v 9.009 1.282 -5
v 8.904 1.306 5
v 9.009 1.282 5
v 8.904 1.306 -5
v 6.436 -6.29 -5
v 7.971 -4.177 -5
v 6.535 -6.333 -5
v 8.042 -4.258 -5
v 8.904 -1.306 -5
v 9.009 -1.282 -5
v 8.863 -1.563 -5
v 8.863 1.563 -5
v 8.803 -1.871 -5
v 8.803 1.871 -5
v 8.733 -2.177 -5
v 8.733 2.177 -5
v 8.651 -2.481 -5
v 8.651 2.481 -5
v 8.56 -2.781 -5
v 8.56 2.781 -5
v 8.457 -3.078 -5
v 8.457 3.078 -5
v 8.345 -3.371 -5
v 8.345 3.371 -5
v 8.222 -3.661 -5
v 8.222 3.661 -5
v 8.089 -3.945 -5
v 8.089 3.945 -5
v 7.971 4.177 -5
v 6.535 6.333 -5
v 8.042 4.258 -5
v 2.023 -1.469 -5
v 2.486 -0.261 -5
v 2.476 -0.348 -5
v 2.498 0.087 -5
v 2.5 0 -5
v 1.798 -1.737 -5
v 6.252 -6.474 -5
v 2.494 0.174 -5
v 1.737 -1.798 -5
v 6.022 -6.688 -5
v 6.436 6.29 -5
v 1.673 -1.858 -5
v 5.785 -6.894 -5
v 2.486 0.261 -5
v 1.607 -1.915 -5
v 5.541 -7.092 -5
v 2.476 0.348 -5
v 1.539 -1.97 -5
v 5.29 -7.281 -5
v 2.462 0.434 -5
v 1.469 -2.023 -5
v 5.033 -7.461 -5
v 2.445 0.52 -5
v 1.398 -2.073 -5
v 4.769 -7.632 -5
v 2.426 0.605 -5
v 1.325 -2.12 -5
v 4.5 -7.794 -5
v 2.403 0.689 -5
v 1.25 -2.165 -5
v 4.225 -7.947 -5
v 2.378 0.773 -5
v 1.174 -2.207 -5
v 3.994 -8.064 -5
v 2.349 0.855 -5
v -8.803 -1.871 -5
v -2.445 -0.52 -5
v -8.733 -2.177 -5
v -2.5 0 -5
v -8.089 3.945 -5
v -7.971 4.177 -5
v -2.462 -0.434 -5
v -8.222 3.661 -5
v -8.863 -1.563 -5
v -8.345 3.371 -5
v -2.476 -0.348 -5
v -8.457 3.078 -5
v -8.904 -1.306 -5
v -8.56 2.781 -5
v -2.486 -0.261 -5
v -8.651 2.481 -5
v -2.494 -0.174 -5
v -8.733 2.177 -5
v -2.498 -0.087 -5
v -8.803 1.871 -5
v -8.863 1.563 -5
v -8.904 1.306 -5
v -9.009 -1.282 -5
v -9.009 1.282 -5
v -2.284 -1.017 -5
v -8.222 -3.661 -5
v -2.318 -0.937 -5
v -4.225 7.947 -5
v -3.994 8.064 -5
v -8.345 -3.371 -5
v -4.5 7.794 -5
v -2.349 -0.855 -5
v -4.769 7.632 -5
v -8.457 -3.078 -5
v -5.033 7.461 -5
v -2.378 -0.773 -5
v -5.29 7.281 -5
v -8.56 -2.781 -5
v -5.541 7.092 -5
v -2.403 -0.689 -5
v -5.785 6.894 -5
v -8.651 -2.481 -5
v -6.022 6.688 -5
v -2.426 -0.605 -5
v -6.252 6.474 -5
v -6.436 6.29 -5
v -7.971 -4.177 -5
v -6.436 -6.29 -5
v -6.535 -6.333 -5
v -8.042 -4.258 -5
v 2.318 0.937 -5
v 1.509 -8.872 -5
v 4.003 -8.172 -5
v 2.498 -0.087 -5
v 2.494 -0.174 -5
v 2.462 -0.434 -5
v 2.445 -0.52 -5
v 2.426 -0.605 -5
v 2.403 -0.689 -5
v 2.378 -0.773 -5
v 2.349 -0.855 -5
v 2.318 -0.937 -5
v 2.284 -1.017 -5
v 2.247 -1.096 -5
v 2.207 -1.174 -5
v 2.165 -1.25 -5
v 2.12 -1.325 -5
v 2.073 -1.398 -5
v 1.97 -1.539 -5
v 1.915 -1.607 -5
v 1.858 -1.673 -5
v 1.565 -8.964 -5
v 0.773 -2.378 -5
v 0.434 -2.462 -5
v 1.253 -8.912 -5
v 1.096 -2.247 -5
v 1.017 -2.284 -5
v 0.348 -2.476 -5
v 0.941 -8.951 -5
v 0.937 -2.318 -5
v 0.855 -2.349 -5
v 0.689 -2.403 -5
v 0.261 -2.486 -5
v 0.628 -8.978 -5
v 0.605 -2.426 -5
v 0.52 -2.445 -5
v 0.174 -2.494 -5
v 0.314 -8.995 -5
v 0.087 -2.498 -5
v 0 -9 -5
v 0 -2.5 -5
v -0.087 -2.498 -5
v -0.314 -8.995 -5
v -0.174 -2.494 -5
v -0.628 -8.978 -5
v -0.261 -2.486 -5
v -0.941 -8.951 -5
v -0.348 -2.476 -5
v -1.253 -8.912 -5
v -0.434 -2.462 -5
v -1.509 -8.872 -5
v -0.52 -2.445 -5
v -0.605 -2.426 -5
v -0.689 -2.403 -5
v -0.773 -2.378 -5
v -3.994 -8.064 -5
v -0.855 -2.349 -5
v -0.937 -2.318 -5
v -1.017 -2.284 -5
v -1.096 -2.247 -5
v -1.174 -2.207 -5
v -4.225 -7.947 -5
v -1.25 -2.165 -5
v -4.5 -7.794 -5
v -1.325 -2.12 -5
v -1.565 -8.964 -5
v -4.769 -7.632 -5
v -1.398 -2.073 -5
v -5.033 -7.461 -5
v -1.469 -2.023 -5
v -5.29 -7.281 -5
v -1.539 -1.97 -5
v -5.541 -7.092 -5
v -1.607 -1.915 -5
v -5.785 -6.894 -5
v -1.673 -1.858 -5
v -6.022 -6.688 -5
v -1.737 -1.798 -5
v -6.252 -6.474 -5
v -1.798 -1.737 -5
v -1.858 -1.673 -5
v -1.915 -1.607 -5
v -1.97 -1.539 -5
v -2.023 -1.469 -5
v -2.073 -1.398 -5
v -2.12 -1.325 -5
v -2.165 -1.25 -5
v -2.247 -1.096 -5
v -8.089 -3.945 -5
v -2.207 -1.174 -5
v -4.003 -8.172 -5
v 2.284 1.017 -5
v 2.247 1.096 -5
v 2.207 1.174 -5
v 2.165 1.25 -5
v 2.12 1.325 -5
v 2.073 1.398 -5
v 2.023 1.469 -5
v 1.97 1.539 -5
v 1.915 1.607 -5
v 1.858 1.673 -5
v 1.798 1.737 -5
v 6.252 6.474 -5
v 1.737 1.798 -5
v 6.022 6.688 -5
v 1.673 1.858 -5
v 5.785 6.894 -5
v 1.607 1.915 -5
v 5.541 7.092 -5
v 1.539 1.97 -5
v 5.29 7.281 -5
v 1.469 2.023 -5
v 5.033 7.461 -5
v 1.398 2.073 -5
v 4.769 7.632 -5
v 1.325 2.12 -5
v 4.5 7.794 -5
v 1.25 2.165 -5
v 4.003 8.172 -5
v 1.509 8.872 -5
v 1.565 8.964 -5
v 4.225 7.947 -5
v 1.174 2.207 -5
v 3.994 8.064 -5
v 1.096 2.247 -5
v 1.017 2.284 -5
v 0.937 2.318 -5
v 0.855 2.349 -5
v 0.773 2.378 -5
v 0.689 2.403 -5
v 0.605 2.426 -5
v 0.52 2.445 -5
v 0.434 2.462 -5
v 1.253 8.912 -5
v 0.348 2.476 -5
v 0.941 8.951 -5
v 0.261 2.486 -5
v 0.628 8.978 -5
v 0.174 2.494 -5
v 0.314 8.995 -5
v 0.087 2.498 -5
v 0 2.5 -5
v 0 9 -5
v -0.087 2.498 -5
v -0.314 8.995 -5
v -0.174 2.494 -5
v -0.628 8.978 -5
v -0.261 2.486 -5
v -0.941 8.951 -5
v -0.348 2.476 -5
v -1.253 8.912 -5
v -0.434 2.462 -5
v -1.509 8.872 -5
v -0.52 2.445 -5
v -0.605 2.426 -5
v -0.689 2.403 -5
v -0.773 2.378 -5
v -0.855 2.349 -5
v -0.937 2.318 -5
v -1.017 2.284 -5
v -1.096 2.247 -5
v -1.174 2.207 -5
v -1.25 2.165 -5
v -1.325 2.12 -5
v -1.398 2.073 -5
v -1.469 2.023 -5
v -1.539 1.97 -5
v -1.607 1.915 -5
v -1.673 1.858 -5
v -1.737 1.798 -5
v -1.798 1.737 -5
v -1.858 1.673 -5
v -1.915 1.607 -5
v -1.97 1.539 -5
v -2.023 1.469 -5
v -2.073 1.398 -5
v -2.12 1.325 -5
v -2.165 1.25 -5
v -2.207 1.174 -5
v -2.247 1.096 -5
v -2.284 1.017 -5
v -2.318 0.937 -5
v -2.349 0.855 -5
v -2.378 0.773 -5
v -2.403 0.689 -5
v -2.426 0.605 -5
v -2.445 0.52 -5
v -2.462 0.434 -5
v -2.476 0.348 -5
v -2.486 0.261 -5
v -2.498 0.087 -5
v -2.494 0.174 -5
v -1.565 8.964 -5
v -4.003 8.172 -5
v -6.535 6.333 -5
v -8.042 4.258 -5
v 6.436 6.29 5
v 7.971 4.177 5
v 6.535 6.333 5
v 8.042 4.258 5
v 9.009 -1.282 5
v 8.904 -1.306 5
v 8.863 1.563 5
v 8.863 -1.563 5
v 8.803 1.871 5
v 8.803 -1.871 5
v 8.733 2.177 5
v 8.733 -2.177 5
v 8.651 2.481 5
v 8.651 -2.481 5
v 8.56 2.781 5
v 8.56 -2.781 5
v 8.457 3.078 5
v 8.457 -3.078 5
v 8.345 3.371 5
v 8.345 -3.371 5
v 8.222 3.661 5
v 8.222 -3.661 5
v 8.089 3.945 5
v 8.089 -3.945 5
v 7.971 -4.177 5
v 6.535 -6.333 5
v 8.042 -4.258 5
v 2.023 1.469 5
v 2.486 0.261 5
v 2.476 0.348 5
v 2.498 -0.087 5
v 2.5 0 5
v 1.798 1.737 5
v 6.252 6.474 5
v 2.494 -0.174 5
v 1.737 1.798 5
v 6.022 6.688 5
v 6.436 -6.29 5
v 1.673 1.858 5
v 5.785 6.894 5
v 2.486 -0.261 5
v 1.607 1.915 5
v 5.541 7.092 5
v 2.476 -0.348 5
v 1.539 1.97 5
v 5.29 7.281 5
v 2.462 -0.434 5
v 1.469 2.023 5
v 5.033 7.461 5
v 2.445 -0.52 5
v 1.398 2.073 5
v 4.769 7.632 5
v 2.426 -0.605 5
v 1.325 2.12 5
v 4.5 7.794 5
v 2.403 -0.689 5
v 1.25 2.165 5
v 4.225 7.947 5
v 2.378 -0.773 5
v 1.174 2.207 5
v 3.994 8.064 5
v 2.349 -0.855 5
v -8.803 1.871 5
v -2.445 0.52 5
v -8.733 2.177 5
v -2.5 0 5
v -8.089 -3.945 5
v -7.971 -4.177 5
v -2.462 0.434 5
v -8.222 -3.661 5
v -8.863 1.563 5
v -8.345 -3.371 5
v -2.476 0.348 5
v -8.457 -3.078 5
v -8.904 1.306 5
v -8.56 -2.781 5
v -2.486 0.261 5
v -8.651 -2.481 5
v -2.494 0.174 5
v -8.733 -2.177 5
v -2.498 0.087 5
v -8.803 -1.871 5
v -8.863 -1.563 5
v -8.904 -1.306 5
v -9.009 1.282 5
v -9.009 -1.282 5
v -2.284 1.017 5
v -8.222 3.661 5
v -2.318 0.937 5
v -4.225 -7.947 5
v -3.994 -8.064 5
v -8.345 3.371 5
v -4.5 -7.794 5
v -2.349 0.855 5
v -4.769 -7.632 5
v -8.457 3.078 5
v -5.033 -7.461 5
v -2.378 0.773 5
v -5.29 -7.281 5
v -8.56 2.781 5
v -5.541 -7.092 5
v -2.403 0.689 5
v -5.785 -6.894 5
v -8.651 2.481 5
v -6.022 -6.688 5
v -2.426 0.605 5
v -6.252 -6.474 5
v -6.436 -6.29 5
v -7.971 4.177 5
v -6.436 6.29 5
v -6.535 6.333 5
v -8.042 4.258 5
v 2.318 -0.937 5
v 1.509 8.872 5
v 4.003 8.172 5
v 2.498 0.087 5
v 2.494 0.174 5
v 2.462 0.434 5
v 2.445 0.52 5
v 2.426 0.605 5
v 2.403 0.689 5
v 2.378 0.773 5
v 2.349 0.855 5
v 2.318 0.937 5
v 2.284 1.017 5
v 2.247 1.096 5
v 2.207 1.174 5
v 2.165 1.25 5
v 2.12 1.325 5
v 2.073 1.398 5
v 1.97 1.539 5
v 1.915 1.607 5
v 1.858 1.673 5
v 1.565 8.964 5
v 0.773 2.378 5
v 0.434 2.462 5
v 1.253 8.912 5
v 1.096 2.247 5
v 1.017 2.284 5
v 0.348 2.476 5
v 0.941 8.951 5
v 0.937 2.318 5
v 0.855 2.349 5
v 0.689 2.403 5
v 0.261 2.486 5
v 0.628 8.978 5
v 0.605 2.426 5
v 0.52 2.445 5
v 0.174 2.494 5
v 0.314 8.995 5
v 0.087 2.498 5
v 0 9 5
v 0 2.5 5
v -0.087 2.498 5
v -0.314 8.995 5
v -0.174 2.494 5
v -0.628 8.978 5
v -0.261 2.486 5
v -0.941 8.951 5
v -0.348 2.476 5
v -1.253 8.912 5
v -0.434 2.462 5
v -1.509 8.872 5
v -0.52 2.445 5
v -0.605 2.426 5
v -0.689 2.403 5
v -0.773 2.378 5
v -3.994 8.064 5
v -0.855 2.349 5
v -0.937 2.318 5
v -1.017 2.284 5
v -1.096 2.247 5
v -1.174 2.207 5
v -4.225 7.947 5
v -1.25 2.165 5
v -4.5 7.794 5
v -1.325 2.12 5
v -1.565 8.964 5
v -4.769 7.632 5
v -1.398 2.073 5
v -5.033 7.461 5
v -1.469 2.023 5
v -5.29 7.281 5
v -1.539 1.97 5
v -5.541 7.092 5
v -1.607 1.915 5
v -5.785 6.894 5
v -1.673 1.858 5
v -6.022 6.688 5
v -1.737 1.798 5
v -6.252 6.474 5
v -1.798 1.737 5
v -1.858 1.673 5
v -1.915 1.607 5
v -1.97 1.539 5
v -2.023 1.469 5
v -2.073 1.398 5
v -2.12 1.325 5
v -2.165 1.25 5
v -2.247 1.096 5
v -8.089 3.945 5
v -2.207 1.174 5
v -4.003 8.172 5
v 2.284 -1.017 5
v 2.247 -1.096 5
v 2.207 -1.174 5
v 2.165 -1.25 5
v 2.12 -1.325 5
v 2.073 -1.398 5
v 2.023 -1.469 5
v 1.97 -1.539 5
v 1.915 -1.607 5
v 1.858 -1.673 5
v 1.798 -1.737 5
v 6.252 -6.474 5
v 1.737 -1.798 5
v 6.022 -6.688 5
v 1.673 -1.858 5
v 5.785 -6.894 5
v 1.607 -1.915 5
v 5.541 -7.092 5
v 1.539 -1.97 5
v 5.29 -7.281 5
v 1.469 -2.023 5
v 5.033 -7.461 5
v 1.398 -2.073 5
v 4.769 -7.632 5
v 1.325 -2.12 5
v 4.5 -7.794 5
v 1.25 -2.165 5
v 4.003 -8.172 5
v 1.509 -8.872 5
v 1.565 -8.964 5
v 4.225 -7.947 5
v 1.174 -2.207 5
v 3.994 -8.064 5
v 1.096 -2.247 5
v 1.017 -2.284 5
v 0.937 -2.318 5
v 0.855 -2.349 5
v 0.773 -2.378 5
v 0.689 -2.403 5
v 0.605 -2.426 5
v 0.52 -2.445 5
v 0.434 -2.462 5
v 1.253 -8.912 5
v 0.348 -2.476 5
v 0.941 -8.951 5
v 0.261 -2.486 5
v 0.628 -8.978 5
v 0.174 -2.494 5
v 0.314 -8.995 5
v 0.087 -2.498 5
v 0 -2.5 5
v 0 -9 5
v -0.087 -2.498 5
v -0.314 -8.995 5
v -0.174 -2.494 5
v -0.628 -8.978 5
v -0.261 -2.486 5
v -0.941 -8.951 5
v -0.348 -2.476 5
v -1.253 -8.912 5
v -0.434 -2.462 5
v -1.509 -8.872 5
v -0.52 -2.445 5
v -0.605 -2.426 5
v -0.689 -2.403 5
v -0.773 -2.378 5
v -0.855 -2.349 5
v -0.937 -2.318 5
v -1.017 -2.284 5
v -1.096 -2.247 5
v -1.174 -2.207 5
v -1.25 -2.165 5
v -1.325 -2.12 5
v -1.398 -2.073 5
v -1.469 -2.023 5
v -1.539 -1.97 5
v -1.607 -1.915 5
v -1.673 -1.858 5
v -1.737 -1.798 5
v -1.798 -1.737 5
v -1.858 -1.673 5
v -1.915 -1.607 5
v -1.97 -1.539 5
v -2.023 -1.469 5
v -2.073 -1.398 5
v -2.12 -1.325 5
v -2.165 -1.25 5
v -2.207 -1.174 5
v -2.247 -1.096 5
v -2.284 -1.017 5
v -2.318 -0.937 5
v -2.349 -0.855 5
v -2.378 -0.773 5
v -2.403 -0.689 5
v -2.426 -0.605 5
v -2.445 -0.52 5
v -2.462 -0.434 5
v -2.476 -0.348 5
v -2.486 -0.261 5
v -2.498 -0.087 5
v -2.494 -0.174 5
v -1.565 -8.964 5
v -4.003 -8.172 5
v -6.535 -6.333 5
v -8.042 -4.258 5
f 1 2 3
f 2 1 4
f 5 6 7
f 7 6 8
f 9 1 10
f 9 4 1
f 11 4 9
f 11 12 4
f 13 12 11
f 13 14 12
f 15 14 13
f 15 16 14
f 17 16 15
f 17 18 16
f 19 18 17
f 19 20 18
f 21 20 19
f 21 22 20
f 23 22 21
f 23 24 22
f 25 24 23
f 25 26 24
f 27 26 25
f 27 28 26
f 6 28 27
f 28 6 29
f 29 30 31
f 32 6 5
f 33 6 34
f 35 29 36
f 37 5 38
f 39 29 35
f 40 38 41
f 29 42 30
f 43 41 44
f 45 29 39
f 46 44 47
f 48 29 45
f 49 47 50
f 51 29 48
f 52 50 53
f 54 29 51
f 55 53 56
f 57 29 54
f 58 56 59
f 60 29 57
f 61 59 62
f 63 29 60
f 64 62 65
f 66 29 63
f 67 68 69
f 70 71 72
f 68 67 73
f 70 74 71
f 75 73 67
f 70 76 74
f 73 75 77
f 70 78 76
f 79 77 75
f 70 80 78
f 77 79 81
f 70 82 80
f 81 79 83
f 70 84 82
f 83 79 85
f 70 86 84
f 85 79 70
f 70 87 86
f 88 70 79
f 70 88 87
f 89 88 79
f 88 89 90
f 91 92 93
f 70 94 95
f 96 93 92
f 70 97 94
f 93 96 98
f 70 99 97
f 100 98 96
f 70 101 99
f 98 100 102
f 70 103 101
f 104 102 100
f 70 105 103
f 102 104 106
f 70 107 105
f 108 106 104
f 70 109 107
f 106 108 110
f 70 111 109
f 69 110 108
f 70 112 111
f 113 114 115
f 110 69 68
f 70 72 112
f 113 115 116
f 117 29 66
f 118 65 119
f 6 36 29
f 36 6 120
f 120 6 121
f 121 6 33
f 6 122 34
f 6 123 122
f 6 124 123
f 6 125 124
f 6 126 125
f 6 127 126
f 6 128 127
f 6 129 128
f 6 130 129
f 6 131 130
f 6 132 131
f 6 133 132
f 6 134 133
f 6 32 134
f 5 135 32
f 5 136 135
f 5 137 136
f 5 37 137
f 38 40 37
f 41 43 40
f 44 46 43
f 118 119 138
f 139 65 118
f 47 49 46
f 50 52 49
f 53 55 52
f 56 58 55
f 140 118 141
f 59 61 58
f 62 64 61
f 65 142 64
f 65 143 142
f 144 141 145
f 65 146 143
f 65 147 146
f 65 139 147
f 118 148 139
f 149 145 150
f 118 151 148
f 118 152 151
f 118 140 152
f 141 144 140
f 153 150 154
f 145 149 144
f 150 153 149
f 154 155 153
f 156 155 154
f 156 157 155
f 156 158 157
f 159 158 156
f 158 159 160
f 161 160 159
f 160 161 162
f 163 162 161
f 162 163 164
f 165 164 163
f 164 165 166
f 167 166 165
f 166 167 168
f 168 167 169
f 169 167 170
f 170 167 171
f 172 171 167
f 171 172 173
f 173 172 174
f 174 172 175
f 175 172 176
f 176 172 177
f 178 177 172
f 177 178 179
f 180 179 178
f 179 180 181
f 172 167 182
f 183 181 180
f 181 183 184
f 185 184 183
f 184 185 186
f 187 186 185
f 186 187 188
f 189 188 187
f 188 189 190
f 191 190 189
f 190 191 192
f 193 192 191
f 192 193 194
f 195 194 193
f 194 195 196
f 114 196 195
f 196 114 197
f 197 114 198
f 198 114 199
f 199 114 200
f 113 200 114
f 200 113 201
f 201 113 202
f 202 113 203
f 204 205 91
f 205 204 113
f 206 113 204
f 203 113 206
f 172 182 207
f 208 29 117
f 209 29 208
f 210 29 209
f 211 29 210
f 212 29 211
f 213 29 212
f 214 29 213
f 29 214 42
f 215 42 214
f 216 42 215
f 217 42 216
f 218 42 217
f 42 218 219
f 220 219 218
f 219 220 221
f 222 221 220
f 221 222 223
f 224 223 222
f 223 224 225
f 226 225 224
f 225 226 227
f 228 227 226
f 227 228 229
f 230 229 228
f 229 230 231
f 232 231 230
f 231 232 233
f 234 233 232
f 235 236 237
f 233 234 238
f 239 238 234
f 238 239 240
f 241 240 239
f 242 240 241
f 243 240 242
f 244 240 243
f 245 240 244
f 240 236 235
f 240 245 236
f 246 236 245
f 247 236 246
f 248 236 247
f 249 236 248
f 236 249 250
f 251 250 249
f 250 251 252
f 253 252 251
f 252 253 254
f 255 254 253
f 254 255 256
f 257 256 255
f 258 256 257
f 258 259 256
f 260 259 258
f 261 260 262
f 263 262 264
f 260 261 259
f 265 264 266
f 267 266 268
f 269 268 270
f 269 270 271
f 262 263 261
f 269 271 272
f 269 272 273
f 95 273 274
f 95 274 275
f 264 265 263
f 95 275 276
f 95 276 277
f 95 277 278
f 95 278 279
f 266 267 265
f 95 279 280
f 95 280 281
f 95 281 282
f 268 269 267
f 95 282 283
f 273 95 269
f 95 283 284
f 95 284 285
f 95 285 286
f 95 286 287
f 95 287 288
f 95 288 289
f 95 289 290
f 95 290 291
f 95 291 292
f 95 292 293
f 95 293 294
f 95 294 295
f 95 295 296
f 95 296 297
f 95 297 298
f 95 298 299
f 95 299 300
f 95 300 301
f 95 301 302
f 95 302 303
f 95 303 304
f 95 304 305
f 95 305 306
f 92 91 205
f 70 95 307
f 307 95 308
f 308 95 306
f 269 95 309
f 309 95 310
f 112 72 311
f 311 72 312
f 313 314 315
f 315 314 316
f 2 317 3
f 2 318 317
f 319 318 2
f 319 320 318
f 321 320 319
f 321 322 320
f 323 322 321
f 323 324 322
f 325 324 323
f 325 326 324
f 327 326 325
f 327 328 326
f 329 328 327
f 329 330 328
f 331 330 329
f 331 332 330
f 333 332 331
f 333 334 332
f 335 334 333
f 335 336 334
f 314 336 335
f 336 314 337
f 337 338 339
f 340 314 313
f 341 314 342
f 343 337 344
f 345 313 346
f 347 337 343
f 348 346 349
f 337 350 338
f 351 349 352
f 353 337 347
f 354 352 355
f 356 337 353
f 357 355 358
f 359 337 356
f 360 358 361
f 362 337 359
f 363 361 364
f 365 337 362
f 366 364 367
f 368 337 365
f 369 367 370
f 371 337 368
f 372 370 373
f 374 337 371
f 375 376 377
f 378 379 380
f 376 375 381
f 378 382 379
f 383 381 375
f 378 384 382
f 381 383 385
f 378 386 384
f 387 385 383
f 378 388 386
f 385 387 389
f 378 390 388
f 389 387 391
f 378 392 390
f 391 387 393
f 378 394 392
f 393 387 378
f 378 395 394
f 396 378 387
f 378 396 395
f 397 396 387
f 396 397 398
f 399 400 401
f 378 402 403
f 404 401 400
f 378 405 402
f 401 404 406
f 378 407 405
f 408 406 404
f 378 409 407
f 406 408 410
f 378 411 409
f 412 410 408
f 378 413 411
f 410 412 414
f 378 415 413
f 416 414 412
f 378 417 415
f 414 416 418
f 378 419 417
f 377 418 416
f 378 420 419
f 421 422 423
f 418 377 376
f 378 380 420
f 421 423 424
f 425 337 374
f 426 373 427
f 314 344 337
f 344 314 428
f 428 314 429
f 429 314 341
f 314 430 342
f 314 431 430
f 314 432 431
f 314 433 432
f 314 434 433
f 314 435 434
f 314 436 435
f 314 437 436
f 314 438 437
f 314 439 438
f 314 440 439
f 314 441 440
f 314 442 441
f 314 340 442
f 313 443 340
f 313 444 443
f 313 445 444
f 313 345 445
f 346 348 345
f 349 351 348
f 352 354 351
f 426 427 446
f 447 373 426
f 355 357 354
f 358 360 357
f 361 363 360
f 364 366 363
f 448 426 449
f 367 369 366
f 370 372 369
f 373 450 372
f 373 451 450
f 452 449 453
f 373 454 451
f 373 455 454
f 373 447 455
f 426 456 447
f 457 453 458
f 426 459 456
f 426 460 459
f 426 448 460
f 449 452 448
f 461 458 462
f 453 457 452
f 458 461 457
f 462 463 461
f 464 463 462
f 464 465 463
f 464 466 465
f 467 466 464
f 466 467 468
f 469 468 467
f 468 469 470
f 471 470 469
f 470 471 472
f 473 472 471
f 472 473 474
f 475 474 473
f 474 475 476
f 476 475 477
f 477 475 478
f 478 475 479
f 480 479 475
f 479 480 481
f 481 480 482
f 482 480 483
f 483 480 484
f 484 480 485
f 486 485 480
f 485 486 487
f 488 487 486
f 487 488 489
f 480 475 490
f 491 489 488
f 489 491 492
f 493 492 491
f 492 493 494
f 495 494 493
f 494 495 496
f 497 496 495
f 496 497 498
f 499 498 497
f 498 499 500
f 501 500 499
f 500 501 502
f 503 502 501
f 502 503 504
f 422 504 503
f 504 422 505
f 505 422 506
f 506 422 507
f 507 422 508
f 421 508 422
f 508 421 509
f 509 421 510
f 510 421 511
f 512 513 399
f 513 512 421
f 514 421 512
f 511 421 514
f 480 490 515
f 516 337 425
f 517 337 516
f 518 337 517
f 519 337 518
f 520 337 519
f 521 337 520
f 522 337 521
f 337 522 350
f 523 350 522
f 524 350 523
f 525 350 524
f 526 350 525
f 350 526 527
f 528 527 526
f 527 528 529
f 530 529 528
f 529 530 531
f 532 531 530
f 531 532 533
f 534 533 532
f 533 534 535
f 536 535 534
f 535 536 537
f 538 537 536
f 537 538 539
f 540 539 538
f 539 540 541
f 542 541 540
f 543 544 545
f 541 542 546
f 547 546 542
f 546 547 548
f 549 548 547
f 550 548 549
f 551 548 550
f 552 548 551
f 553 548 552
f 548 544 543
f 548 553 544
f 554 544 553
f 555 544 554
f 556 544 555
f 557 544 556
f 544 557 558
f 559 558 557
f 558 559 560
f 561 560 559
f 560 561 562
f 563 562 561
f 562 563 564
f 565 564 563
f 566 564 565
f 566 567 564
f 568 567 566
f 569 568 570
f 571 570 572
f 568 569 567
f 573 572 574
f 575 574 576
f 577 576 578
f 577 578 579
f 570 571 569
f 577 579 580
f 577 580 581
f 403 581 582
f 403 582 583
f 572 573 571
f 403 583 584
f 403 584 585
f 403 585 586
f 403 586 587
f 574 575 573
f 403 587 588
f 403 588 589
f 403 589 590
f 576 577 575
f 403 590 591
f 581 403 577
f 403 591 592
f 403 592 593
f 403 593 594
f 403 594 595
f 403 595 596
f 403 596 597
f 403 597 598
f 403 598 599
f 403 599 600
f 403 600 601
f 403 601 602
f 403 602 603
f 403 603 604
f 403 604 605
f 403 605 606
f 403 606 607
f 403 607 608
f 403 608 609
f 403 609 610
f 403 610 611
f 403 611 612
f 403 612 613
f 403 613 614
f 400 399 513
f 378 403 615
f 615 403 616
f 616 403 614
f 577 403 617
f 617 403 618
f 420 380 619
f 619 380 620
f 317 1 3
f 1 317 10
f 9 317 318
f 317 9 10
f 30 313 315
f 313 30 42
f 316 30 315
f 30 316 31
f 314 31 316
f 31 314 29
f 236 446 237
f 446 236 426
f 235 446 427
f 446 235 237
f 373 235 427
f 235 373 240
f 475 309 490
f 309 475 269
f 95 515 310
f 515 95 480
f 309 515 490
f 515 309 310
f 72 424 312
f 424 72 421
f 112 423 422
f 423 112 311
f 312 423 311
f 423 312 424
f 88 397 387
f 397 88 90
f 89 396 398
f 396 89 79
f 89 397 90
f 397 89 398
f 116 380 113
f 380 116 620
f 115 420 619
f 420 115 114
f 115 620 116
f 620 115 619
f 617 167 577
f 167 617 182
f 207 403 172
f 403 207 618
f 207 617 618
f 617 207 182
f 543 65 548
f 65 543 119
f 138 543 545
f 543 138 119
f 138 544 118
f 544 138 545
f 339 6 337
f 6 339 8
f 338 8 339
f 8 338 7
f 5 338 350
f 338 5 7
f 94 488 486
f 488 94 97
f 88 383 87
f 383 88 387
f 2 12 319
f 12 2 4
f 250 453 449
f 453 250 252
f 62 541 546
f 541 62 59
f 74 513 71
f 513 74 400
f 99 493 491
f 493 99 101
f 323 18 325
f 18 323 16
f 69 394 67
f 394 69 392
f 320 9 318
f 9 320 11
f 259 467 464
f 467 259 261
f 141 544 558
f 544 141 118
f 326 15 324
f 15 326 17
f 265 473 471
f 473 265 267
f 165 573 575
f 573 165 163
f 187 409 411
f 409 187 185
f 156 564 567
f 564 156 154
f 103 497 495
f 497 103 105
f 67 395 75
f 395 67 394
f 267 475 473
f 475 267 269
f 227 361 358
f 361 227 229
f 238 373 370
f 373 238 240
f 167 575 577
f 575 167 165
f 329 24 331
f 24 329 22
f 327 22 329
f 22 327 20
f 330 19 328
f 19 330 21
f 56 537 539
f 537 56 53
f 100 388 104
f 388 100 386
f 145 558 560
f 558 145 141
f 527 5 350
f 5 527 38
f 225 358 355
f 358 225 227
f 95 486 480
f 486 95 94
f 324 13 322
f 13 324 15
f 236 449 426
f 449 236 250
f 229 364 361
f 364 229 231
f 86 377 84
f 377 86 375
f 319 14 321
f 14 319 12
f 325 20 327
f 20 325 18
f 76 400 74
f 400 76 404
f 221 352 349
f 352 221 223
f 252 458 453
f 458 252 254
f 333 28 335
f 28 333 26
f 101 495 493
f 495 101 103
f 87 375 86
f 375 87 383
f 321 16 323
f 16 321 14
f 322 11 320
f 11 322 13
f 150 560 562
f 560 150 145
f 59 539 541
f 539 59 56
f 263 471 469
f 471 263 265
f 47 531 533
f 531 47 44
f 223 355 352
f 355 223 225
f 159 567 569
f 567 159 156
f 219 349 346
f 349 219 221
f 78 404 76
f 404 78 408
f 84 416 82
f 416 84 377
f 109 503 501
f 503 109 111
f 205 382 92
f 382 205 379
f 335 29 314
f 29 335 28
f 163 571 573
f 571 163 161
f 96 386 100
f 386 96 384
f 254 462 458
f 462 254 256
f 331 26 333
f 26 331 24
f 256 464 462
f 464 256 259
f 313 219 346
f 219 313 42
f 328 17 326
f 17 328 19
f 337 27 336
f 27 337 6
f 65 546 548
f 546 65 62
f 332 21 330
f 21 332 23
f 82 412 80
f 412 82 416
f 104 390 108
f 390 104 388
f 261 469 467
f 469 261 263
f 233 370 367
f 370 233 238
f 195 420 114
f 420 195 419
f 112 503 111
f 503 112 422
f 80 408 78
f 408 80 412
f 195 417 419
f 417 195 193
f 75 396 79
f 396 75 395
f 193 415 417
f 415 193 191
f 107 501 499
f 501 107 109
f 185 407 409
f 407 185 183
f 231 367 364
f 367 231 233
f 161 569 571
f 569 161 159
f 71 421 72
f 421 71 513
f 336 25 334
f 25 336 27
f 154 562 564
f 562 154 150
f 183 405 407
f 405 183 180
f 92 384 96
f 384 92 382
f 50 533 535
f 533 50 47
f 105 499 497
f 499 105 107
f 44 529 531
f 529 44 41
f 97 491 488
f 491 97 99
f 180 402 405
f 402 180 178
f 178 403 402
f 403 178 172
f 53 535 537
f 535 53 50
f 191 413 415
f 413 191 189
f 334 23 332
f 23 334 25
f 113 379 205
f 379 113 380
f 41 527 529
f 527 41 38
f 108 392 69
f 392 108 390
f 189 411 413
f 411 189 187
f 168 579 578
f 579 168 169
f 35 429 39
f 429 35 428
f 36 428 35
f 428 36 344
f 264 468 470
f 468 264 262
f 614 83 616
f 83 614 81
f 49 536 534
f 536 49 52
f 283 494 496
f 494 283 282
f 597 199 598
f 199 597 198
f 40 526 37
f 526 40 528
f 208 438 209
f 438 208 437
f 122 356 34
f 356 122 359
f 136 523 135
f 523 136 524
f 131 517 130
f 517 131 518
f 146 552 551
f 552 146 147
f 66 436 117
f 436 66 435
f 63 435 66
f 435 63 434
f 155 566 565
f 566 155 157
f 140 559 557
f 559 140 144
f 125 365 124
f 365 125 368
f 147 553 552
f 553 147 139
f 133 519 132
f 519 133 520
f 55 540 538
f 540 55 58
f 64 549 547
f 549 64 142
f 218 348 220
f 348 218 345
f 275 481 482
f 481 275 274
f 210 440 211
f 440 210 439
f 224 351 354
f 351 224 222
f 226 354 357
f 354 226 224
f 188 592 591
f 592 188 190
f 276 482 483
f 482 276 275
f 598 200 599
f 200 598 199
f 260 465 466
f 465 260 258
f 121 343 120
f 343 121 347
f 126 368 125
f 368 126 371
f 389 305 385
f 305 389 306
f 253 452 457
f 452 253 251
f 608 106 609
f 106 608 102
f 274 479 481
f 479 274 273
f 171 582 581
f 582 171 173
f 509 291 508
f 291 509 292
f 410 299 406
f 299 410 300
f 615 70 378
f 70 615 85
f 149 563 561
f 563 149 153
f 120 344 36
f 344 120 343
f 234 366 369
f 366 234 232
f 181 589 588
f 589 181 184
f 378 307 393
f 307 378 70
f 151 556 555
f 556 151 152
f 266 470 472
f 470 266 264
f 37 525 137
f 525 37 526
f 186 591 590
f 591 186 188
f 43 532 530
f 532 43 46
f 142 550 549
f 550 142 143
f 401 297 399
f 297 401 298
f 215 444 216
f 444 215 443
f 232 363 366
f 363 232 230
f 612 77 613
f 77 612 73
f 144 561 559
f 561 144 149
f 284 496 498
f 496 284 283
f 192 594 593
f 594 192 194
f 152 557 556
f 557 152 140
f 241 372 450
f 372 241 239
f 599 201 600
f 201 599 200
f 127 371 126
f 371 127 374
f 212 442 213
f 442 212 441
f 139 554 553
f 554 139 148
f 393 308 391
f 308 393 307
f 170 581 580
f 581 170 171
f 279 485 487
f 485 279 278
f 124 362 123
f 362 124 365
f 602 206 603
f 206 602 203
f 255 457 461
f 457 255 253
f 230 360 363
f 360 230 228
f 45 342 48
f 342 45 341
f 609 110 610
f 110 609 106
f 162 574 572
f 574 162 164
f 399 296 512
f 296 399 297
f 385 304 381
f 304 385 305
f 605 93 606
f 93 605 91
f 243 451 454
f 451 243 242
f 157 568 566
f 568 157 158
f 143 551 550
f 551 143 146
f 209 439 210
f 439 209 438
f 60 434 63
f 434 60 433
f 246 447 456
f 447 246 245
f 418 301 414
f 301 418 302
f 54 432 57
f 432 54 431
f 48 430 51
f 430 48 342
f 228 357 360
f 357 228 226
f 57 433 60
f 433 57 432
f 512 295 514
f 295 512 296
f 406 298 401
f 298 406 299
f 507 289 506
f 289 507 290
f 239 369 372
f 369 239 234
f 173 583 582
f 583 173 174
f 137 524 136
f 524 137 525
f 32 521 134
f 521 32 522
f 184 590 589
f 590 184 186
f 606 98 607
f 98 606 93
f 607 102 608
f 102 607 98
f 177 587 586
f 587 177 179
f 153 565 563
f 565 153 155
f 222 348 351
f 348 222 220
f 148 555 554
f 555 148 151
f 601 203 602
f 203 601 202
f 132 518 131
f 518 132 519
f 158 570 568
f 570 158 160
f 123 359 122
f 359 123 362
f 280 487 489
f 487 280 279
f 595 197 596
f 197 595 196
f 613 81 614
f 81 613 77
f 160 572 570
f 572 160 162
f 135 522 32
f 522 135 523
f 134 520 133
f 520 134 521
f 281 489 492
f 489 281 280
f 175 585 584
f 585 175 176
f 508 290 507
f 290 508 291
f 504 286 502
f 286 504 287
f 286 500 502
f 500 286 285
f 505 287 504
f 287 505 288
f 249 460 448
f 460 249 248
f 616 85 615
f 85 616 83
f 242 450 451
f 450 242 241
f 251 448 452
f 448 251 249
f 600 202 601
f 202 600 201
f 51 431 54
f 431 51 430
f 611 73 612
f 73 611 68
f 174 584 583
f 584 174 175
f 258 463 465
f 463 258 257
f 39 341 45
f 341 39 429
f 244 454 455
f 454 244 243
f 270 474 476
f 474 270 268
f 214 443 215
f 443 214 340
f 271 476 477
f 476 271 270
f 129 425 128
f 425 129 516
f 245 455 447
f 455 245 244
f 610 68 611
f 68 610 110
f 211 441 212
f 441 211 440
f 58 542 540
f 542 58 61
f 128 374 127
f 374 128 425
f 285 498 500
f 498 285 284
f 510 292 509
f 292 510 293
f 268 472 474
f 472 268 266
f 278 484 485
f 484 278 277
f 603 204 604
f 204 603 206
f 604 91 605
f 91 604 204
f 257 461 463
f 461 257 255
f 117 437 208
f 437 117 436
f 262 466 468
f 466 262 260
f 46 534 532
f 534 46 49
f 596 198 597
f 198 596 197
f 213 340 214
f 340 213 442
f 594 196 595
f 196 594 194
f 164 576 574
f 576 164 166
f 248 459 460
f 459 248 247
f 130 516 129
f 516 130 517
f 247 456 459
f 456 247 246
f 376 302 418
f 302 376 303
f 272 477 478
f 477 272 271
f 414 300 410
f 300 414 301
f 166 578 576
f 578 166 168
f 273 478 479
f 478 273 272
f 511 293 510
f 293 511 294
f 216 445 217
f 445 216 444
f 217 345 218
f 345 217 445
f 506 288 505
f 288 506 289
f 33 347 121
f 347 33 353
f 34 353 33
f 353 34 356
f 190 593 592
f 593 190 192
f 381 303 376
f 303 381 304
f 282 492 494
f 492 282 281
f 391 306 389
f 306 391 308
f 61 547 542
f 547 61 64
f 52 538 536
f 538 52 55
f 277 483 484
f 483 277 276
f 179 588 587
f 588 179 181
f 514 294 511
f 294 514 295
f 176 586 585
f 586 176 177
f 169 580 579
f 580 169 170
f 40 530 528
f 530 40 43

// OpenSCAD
$fn = 180;

// Timing pulley (simplified) with 10 teeth and 15.0mm pitch diameter
// Assumes trapezoidal tooth approximation around pitch circle.

teeth = 10;
pitch_d = 15.0;          // mm
pitch_r = pitch_d/2;

pulley_width = 10;       // mm
hub_d = 18;              // mm (body OD, slightly larger than pitch)
bore_d = 5;              // mm

// Tooth geometry (approx)
tooth_height = 1.6;      // radial height above pitch circle
tooth_root_depth = 0.6;  // radial depth below pitch circle (into body)
tooth_tip_arc_frac = 0.45; // fraction of tooth pitch occupied by tip width
tooth_root_arc_frac = 0.85; // fraction of tooth pitch occupied by root width

pitch_circ = PI * pitch_d;
tooth_pitch = pitch_circ / teeth;
tooth_pitch_angle = 360 / teeth;

module tooth2d() {
    // Build a trapezoid in polar-ish coordinates around pitch circle:
    // inner radius at (pitch_r - tooth_root_depth), outer at (pitch_r + tooth_height)
    // widths are expressed as arc lengths at pitch radius, converted to angles.
    inner_r = pitch_r - tooth_root_depth;
    outer_r = pitch_r + tooth_height;

    tip_w = tooth_pitch * tooth_tip_arc_frac;
    root_w = tooth_pitch * tooth_root_arc_frac;

    tip_ang = (tip_w / pitch_r) * 180 / PI;
    root_ang = (root_w / pitch_r) * 180 / PI;

    // Points defined in XY using angles about origin
    function pt(r,a) = [r*cos(a), r*sin(a)];

    polygon(points=[
        pt(inner_r, -root_ang/2),
        pt(outer_r, -tip_ang/2),
        pt(outer_r,  tip_ang/2),
        pt(inner_r,  root_ang/2)
    ]);
}

module pulley() {
    difference() {
        union() {
            // Base cylinder (body)
            cylinder(d=hub_d, h=pulley_width, center=true);

            // Teeth ring
            for (i = [0:teeth-1]) {
                rotate([0,0,i*tooth_pitch_angle])
                    linear_extrude(height=pulley_width, center=true)
                        tooth2d();
            }
        }

        // Bore
        cylinder(d=bore_d, h=pulley_width+2, center=true);
    }
}

pulley();
